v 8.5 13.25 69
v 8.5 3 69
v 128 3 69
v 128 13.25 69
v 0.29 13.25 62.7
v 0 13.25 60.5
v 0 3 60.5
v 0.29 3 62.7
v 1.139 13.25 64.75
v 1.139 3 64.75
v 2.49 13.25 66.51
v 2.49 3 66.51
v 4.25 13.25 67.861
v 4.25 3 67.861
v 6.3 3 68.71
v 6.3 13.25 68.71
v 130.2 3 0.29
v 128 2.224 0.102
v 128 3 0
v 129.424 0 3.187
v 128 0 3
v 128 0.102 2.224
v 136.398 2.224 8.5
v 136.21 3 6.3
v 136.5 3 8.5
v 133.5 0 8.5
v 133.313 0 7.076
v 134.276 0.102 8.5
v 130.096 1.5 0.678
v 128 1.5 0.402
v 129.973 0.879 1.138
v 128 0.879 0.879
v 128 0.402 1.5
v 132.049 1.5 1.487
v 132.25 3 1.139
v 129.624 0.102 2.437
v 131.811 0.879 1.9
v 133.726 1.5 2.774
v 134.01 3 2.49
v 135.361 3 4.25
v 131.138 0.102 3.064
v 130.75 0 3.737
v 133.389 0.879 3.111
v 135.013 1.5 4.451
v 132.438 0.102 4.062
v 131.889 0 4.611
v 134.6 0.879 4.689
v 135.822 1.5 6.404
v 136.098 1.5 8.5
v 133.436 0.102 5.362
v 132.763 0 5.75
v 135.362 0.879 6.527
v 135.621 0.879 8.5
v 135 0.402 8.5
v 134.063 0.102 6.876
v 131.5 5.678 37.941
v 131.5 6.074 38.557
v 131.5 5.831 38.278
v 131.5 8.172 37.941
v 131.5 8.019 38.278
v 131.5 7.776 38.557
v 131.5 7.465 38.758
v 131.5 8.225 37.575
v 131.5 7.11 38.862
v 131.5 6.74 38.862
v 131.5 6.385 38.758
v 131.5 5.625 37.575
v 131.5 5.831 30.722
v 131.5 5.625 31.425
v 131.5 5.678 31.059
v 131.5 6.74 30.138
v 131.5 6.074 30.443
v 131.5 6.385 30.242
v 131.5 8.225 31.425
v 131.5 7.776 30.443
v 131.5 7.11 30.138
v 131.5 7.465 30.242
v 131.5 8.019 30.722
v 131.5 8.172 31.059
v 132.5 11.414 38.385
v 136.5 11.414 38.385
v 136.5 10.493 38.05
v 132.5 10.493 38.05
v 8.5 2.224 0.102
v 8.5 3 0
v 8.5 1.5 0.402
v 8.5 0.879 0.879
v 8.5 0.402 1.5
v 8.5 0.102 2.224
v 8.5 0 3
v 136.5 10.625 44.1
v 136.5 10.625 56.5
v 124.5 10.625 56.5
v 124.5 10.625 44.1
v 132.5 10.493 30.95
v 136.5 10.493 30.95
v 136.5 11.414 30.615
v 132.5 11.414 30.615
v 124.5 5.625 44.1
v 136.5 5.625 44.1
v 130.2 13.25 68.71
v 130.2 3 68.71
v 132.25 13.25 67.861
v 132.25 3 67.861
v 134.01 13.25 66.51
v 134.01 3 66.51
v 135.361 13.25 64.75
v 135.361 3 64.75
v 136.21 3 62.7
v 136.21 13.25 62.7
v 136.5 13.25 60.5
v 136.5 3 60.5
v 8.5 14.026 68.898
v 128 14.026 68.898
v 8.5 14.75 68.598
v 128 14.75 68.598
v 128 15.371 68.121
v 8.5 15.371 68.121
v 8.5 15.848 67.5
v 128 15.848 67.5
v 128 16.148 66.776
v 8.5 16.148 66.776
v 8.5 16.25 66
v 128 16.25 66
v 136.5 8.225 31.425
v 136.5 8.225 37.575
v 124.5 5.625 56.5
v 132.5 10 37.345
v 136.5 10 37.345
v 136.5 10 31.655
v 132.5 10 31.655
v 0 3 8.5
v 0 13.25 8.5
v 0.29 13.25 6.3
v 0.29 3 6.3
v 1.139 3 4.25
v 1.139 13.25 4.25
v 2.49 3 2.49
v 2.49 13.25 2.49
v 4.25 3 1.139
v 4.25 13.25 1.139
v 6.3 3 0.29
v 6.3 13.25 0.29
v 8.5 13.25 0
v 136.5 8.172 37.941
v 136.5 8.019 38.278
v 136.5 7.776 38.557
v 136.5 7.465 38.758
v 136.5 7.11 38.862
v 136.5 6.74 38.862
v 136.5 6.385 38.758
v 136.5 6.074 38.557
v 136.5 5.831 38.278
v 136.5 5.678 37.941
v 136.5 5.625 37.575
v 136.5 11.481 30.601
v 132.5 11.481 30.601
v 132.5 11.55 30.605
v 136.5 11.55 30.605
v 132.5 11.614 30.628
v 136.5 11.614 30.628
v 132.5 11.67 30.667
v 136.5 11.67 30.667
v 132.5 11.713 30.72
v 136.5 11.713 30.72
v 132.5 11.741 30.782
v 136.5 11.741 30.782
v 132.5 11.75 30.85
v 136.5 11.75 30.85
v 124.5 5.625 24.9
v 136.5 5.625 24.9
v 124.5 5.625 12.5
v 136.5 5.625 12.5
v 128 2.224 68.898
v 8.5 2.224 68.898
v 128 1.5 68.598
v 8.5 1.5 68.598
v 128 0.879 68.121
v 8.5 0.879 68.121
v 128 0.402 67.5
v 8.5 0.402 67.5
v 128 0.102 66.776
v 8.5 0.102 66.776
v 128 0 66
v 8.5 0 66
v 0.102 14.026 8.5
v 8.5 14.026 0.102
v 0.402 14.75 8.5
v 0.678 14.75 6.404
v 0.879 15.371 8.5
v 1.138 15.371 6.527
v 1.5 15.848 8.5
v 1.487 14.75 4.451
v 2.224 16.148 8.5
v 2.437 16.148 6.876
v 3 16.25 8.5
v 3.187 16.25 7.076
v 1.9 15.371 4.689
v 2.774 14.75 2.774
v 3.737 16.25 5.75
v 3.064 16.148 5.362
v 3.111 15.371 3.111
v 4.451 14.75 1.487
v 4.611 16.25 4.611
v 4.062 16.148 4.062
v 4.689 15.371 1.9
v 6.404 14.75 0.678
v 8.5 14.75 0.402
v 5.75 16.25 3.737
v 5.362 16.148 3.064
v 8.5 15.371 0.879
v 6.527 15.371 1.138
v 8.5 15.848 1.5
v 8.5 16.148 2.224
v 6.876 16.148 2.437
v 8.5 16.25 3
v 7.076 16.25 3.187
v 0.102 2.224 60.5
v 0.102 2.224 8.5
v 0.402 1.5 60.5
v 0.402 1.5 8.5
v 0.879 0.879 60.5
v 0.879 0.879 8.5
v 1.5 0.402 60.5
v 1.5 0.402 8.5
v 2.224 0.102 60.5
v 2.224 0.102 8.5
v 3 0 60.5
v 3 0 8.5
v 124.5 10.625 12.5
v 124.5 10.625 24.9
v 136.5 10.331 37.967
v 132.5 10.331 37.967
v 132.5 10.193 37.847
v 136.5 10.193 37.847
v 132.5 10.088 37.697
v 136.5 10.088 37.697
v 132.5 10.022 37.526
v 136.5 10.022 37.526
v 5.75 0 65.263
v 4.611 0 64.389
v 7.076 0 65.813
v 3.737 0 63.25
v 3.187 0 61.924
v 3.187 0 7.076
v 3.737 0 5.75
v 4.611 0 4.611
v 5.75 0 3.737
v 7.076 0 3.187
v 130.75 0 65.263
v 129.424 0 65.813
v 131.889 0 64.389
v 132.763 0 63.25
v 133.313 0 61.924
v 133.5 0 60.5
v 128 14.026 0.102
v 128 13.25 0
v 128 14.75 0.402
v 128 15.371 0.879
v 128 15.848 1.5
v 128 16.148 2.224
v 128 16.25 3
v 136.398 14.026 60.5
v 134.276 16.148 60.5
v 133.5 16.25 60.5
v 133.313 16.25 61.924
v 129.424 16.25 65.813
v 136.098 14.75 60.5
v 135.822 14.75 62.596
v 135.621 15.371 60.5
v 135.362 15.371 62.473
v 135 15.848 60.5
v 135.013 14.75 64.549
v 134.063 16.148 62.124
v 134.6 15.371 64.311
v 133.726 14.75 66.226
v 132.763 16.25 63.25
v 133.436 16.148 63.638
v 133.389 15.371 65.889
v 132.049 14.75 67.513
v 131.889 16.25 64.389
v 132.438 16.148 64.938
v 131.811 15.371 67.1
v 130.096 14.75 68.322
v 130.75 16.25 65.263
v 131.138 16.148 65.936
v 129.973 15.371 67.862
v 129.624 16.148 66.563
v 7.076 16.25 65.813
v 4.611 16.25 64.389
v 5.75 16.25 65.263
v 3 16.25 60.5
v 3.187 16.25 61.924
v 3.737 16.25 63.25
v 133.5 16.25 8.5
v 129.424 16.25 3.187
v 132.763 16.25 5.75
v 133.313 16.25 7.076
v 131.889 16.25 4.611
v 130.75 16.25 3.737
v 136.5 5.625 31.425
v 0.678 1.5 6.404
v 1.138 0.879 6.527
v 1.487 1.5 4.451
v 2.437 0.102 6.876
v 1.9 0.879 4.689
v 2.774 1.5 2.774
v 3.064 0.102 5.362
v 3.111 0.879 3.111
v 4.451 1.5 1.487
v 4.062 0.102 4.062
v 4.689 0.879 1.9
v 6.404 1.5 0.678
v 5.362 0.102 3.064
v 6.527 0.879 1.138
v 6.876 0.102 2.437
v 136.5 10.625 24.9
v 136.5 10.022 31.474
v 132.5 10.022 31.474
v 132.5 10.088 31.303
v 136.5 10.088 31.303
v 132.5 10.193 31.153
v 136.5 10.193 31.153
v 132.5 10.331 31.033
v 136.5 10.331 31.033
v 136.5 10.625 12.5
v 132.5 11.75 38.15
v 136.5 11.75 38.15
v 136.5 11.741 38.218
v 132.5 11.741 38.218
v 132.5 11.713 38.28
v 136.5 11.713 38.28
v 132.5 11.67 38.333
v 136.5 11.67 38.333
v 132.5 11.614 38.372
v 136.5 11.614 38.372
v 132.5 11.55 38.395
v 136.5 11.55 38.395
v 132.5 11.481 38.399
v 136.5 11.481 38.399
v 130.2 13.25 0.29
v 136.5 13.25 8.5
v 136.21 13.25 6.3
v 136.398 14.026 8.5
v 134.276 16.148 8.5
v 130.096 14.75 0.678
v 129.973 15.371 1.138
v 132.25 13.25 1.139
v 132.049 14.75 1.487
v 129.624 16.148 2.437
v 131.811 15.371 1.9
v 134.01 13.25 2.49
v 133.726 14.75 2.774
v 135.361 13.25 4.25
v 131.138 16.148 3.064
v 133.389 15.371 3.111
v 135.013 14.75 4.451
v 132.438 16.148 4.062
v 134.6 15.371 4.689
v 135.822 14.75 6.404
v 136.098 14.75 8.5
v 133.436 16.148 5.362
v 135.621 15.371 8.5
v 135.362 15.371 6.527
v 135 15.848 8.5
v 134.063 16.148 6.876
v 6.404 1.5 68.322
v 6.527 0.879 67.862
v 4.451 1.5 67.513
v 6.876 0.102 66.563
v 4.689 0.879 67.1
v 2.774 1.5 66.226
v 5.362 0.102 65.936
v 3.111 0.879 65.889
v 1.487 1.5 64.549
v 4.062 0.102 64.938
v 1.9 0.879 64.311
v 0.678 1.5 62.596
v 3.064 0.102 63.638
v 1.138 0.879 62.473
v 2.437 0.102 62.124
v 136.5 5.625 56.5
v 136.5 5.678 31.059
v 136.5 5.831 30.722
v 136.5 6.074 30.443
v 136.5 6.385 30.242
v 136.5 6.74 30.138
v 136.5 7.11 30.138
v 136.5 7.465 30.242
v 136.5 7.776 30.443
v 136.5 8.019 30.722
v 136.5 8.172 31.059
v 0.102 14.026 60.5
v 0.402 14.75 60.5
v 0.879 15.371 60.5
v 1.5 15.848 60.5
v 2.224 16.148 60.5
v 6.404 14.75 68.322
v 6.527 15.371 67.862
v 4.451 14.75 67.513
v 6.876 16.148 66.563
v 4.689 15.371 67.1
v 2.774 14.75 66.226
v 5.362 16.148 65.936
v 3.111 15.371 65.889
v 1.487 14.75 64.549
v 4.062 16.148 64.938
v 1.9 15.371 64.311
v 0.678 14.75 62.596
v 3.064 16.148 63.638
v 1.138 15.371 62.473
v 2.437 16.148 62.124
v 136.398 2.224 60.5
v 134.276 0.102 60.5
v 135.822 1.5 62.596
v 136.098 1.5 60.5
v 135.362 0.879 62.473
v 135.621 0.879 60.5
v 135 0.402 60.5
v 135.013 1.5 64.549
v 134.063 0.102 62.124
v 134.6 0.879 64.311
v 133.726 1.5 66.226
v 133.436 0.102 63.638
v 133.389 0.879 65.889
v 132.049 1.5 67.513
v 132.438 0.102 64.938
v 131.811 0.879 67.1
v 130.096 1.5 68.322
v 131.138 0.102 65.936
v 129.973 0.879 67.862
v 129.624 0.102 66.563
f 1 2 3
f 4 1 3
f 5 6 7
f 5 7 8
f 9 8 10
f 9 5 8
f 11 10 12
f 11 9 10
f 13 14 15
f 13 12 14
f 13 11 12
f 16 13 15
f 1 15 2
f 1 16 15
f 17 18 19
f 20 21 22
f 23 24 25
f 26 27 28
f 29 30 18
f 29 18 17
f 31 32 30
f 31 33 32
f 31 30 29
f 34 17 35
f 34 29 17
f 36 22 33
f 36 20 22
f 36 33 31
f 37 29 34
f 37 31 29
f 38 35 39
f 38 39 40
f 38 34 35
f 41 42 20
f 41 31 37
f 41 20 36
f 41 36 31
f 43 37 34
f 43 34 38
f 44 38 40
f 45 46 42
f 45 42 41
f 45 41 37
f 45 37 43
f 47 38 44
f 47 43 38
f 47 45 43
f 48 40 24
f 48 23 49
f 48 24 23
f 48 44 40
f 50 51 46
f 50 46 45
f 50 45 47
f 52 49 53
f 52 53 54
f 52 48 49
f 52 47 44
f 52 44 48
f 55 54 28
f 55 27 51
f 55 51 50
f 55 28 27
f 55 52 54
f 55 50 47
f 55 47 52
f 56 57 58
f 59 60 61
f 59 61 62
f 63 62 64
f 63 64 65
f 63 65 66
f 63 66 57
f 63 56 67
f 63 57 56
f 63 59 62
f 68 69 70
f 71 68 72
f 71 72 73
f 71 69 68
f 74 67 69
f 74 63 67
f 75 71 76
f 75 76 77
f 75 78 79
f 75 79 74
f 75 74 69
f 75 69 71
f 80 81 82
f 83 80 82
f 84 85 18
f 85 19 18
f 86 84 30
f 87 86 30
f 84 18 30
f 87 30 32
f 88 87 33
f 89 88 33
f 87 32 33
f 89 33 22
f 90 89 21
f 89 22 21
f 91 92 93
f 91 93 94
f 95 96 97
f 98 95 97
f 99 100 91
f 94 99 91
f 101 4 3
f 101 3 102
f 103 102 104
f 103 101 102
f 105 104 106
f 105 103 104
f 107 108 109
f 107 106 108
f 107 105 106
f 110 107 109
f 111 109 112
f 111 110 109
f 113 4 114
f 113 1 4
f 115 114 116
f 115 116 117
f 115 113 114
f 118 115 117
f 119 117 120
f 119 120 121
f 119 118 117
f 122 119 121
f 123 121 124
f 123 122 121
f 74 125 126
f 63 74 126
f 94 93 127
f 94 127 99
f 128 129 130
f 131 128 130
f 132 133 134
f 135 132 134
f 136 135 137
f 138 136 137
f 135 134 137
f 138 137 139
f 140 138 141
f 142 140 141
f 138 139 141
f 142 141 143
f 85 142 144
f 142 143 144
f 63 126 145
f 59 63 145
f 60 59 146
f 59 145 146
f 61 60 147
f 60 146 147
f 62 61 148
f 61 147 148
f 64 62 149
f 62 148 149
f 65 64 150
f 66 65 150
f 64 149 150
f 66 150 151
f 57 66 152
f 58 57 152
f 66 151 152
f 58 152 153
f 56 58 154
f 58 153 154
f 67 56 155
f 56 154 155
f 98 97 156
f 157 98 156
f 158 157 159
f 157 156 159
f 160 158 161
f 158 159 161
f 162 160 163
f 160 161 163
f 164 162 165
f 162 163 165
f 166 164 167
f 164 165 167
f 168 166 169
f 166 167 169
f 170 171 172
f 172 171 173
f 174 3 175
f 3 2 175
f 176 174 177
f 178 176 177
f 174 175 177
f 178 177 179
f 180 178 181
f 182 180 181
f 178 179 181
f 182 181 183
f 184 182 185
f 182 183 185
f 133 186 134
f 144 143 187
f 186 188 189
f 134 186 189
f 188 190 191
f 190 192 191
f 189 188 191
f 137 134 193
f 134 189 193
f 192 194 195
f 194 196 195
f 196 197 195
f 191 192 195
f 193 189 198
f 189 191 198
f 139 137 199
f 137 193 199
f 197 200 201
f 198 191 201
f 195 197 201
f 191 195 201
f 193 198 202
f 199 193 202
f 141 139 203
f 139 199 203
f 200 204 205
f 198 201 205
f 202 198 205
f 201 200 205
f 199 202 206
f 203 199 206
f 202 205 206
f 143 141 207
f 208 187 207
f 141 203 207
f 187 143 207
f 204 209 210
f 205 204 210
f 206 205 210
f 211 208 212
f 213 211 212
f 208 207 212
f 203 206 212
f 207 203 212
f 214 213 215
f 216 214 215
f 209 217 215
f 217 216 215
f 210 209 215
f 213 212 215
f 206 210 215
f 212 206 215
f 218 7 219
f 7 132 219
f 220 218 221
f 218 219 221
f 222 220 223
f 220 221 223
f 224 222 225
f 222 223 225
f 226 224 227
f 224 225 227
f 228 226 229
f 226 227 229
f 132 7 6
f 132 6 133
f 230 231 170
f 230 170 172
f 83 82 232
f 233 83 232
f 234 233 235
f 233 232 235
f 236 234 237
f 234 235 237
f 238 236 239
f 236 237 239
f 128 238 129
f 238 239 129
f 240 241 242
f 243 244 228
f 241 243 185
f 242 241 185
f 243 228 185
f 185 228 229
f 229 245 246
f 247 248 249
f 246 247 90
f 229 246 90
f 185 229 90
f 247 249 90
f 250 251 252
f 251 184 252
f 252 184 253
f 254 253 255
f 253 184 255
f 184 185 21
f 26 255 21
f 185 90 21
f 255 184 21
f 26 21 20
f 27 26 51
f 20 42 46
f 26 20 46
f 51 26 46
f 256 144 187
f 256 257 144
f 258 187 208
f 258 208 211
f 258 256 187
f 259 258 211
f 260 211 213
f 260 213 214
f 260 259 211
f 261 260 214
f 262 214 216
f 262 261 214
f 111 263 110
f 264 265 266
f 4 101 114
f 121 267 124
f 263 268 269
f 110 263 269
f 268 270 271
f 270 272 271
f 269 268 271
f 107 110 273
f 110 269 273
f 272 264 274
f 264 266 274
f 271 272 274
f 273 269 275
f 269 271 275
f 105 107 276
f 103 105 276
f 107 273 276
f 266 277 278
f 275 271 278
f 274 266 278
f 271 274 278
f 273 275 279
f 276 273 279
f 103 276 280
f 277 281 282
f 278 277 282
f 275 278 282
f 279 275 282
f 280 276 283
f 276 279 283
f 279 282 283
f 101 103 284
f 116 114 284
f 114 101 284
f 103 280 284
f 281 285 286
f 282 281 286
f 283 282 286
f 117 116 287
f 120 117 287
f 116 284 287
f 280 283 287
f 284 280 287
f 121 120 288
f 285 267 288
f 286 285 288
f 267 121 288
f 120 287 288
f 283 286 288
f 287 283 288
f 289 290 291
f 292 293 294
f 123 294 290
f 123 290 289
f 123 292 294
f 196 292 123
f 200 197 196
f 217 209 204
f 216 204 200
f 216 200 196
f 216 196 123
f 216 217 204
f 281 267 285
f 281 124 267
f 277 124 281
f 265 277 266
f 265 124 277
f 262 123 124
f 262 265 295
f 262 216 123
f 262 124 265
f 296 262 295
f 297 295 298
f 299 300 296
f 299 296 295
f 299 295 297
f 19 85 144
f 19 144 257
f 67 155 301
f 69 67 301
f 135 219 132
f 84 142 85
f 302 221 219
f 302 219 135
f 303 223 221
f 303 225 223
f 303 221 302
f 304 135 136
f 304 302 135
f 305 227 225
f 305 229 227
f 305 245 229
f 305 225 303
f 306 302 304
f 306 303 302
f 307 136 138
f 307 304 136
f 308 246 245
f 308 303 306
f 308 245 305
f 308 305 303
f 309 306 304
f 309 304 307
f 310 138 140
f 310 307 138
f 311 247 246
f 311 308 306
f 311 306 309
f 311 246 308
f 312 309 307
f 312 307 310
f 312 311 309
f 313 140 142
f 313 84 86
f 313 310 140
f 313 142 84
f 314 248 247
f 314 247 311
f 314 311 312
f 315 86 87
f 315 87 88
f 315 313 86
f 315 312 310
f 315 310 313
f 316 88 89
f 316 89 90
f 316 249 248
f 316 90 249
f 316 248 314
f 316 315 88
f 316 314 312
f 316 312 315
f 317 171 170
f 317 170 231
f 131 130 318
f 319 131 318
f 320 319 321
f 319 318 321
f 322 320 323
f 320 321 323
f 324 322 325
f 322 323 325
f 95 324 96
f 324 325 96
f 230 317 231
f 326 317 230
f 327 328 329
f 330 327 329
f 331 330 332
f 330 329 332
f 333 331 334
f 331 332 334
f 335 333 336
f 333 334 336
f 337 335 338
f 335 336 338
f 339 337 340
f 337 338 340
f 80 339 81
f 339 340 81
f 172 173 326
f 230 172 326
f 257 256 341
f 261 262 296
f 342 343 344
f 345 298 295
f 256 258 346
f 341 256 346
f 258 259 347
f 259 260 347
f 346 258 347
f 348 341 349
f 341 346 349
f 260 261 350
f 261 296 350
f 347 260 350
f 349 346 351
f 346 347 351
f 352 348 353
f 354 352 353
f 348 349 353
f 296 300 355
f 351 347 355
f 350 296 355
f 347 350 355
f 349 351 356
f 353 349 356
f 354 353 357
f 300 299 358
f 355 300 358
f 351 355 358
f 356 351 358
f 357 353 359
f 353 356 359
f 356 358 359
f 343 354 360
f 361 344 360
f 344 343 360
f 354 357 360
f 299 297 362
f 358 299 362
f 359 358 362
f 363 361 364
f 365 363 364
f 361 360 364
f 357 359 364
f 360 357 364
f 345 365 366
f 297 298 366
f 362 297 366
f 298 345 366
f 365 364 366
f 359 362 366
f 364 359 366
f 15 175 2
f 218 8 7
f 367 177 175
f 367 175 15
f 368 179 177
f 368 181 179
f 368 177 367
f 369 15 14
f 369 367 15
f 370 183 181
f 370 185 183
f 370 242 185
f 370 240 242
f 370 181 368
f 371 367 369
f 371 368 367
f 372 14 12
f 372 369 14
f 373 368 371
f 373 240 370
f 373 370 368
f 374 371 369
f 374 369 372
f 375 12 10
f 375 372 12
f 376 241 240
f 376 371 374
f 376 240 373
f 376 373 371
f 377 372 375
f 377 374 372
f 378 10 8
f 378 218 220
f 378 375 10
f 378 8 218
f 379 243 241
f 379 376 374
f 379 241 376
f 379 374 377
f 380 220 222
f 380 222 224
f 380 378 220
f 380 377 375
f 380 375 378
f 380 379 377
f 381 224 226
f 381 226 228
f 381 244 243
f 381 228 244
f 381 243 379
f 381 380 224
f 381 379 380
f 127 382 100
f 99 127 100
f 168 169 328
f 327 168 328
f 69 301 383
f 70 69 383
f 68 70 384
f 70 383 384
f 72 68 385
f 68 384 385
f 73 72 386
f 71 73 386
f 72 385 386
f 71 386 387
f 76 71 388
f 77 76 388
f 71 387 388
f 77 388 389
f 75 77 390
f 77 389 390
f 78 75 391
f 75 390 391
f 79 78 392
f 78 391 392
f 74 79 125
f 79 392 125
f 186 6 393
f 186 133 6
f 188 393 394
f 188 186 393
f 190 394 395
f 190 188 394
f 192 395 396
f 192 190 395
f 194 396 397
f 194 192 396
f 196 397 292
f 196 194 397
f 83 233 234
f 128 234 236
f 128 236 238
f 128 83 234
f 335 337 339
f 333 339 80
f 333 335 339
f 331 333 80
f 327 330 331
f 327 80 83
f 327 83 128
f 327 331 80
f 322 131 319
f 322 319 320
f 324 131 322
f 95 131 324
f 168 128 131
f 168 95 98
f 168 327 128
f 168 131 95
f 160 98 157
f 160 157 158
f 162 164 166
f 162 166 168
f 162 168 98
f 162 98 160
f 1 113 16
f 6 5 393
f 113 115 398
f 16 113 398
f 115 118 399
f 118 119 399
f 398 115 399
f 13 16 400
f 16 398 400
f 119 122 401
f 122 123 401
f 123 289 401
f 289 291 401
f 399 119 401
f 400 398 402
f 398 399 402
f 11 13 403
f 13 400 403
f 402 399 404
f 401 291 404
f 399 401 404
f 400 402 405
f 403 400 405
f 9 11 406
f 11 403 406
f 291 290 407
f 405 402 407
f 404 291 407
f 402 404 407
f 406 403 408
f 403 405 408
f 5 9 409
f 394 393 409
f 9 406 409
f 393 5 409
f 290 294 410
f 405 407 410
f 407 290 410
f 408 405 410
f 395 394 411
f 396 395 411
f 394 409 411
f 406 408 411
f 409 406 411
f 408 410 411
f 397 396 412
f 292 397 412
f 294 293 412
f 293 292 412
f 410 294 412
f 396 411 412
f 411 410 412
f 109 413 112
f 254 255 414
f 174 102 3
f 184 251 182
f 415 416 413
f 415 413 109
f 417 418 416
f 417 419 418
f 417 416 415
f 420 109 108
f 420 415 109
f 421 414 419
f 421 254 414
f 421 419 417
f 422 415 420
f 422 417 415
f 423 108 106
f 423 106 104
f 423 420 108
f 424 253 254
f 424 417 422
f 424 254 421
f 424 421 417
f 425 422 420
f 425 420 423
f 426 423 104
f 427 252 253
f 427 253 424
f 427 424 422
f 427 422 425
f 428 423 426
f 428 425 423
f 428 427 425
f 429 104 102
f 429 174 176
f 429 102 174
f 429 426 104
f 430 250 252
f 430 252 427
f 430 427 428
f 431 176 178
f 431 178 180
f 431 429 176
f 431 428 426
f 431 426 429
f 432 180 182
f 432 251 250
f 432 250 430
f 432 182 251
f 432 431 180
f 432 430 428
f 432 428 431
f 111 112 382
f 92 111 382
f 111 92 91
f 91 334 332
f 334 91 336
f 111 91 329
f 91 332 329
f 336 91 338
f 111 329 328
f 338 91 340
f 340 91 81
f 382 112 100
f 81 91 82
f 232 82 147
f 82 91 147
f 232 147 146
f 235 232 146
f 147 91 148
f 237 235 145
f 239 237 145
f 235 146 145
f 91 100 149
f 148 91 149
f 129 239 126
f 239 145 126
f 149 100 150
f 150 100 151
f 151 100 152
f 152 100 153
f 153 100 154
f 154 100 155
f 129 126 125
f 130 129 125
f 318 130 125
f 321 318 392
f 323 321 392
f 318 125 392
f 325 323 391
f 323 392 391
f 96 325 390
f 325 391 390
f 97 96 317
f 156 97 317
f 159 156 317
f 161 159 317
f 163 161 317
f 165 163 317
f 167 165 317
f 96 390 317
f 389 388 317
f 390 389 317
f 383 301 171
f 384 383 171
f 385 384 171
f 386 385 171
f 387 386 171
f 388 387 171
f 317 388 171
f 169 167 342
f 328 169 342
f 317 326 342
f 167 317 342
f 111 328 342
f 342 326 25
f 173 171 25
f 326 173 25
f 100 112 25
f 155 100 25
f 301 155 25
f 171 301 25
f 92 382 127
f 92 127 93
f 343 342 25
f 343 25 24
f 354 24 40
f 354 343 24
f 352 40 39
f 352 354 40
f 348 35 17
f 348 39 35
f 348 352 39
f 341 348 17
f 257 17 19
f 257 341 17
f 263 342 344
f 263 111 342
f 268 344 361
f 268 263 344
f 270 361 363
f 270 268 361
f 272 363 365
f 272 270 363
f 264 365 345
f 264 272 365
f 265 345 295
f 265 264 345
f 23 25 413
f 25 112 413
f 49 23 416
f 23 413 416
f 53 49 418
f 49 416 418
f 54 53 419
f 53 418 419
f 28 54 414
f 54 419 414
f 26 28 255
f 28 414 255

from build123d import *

# Parameters (mm, degrees)
SKETCH1_W           = 136.5
SKETCH1_H           = 69
BOSS_EXTRUDE1_DEPTH = 16.25
FILLET1_R           = 8.5
FILLET2_R           = 3
SKETCH2_W           = 12.4
SKETCH2_H           = 5
CUT_EXTRUDE1_DEPTH  = 12
CUT_EXTRUDE2_DEPTH  = 5
CUT_EXTRUDE3_DEPTH  = 4


with BuildPart() as part:
    # Sketch1 → Boss-Extrude1 (new body)
    with BuildSketch(Plane(origin=(0, 0, 0), x_dir=(1, 0, 0), z_dir=(0, 1, 0))):
        with Locations((68.25, -34.5)):
            Rectangle(SKETCH1_W, SKETCH1_H)
    extrude(amount=BOSS_EXTRUDE1_DEPTH)

    # Fillet1
    fillet1_edges = [part.edges().sort_by_distance(p)[0] for p in [
        (0, 8.125, 0),
        (136.5, 8.125, 0),
        (136.5, 8.125, 69),
        (0, 8.125, 69),
    ]]
    fillet(fillet1_edges, radius=FILLET1_R)

    # Fillet2
    fillet2_edges = [part.edges().sort_by_distance(p)[0] for p in [
        (0, 0, 34.5),
        (0, 16.25, 34.5),
        (68.25, 0, 0),
        (136.5, 0, 34.5),
        (68.25, 0, 69),
        (134.01040764, 0, 66.51040764),
        (134.01040764, 0, 2.48959236),
        (2.48959236, 0, 66.51040764),
        (2.48959236, 0, 2.48959236),
        (68.25, 16.25, 0),
        (68.25, 16.25, 69),
        (136.5, 16.25, 34.5),
        (134.01040764, 16.25, 66.51040764),
        (134.01040764, 16.25, 2.48959236),
        (2.48959236, 16.25, 66.51040764),
        (2.48959236, 16.25, 2.48959236),
    ]]
    fillet(fillet2_edges, radius=FILLET2_R)

    # Sketch2 → Cut-Extrude1 (cut)
    with BuildSketch(Plane(origin=(136.5, 0, 0), x_dir=(0, 0, -1), z_dir=(1, 0, 0))):
        with Locations((-18.7, 8.125)):
            Rectangle(SKETCH2_W, SKETCH2_H)
        with Locations((-50.3, 8.125)):
            Rectangle(SKETCH2_W, SKETCH2_H)
    extrude(amount=-CUT_EXTRUDE1_DEPTH, mode=Mode.SUBTRACT)

    # Sketch3 → Cut-Extrude2 (cut)
    with BuildSketch(Plane(origin=(136.5, 0, 0), x_dir=(0, 0, -1), z_dir=(1, 0, 0))):
        with BuildLine():
            Line((-37.575, 5.625), (-31.425, 5.625))
            ThreePointArc((-31.425, 5.625), (-30.125, 6.925), (-31.425, 8.225))
            Line((-31.425, 8.225), (-37.575, 8.225))
            ThreePointArc((-37.575, 8.225), (-38.875, 6.925), (-37.575, 5.625))
        make_face()
    extrude(amount=-CUT_EXTRUDE2_DEPTH, mode=Mode.SUBTRACT)

    # Sketch4 → Cut-Extrude3 (cut)
    with BuildSketch(Plane(origin=(136.5, 0, 0), x_dir=(0, 0, -1), z_dir=(1, 0, 0))):
        with BuildLine():
            Line((-37.344933438, 10), (-31.655066562, 10))
            ThreePointArc((-31.655066562, 10), (-31.224884235, 10.135635967), (-30.950297096, 10.493484893))
            Line((-30.950297096, 10.493484893), (-30.615076845, 11.414494964))
            ThreePointArc((-30.615076845, 11.414494964), (-30.645211989, 11.643394109), (-30.85, 11.75))
            Line((-30.85, 11.75), (-38.15, 11.75))
            ThreePointArc((-38.15, 11.75), (-38.354788011, 11.643394109), (-38.384923155, 11.414494964))
            Line((-38.384923155, 11.414494964), (-38.049702904, 10.493484893))
            ThreePointArc((-38.049702904, 10.493484893), (-37.775115765, 10.135635967), (-37.344933438, 10))
        make_face()
    extrude(amount=-CUT_EXTRUDE3_DEPTH, mode=Mode.SUBTRACT)


solid = part.part
